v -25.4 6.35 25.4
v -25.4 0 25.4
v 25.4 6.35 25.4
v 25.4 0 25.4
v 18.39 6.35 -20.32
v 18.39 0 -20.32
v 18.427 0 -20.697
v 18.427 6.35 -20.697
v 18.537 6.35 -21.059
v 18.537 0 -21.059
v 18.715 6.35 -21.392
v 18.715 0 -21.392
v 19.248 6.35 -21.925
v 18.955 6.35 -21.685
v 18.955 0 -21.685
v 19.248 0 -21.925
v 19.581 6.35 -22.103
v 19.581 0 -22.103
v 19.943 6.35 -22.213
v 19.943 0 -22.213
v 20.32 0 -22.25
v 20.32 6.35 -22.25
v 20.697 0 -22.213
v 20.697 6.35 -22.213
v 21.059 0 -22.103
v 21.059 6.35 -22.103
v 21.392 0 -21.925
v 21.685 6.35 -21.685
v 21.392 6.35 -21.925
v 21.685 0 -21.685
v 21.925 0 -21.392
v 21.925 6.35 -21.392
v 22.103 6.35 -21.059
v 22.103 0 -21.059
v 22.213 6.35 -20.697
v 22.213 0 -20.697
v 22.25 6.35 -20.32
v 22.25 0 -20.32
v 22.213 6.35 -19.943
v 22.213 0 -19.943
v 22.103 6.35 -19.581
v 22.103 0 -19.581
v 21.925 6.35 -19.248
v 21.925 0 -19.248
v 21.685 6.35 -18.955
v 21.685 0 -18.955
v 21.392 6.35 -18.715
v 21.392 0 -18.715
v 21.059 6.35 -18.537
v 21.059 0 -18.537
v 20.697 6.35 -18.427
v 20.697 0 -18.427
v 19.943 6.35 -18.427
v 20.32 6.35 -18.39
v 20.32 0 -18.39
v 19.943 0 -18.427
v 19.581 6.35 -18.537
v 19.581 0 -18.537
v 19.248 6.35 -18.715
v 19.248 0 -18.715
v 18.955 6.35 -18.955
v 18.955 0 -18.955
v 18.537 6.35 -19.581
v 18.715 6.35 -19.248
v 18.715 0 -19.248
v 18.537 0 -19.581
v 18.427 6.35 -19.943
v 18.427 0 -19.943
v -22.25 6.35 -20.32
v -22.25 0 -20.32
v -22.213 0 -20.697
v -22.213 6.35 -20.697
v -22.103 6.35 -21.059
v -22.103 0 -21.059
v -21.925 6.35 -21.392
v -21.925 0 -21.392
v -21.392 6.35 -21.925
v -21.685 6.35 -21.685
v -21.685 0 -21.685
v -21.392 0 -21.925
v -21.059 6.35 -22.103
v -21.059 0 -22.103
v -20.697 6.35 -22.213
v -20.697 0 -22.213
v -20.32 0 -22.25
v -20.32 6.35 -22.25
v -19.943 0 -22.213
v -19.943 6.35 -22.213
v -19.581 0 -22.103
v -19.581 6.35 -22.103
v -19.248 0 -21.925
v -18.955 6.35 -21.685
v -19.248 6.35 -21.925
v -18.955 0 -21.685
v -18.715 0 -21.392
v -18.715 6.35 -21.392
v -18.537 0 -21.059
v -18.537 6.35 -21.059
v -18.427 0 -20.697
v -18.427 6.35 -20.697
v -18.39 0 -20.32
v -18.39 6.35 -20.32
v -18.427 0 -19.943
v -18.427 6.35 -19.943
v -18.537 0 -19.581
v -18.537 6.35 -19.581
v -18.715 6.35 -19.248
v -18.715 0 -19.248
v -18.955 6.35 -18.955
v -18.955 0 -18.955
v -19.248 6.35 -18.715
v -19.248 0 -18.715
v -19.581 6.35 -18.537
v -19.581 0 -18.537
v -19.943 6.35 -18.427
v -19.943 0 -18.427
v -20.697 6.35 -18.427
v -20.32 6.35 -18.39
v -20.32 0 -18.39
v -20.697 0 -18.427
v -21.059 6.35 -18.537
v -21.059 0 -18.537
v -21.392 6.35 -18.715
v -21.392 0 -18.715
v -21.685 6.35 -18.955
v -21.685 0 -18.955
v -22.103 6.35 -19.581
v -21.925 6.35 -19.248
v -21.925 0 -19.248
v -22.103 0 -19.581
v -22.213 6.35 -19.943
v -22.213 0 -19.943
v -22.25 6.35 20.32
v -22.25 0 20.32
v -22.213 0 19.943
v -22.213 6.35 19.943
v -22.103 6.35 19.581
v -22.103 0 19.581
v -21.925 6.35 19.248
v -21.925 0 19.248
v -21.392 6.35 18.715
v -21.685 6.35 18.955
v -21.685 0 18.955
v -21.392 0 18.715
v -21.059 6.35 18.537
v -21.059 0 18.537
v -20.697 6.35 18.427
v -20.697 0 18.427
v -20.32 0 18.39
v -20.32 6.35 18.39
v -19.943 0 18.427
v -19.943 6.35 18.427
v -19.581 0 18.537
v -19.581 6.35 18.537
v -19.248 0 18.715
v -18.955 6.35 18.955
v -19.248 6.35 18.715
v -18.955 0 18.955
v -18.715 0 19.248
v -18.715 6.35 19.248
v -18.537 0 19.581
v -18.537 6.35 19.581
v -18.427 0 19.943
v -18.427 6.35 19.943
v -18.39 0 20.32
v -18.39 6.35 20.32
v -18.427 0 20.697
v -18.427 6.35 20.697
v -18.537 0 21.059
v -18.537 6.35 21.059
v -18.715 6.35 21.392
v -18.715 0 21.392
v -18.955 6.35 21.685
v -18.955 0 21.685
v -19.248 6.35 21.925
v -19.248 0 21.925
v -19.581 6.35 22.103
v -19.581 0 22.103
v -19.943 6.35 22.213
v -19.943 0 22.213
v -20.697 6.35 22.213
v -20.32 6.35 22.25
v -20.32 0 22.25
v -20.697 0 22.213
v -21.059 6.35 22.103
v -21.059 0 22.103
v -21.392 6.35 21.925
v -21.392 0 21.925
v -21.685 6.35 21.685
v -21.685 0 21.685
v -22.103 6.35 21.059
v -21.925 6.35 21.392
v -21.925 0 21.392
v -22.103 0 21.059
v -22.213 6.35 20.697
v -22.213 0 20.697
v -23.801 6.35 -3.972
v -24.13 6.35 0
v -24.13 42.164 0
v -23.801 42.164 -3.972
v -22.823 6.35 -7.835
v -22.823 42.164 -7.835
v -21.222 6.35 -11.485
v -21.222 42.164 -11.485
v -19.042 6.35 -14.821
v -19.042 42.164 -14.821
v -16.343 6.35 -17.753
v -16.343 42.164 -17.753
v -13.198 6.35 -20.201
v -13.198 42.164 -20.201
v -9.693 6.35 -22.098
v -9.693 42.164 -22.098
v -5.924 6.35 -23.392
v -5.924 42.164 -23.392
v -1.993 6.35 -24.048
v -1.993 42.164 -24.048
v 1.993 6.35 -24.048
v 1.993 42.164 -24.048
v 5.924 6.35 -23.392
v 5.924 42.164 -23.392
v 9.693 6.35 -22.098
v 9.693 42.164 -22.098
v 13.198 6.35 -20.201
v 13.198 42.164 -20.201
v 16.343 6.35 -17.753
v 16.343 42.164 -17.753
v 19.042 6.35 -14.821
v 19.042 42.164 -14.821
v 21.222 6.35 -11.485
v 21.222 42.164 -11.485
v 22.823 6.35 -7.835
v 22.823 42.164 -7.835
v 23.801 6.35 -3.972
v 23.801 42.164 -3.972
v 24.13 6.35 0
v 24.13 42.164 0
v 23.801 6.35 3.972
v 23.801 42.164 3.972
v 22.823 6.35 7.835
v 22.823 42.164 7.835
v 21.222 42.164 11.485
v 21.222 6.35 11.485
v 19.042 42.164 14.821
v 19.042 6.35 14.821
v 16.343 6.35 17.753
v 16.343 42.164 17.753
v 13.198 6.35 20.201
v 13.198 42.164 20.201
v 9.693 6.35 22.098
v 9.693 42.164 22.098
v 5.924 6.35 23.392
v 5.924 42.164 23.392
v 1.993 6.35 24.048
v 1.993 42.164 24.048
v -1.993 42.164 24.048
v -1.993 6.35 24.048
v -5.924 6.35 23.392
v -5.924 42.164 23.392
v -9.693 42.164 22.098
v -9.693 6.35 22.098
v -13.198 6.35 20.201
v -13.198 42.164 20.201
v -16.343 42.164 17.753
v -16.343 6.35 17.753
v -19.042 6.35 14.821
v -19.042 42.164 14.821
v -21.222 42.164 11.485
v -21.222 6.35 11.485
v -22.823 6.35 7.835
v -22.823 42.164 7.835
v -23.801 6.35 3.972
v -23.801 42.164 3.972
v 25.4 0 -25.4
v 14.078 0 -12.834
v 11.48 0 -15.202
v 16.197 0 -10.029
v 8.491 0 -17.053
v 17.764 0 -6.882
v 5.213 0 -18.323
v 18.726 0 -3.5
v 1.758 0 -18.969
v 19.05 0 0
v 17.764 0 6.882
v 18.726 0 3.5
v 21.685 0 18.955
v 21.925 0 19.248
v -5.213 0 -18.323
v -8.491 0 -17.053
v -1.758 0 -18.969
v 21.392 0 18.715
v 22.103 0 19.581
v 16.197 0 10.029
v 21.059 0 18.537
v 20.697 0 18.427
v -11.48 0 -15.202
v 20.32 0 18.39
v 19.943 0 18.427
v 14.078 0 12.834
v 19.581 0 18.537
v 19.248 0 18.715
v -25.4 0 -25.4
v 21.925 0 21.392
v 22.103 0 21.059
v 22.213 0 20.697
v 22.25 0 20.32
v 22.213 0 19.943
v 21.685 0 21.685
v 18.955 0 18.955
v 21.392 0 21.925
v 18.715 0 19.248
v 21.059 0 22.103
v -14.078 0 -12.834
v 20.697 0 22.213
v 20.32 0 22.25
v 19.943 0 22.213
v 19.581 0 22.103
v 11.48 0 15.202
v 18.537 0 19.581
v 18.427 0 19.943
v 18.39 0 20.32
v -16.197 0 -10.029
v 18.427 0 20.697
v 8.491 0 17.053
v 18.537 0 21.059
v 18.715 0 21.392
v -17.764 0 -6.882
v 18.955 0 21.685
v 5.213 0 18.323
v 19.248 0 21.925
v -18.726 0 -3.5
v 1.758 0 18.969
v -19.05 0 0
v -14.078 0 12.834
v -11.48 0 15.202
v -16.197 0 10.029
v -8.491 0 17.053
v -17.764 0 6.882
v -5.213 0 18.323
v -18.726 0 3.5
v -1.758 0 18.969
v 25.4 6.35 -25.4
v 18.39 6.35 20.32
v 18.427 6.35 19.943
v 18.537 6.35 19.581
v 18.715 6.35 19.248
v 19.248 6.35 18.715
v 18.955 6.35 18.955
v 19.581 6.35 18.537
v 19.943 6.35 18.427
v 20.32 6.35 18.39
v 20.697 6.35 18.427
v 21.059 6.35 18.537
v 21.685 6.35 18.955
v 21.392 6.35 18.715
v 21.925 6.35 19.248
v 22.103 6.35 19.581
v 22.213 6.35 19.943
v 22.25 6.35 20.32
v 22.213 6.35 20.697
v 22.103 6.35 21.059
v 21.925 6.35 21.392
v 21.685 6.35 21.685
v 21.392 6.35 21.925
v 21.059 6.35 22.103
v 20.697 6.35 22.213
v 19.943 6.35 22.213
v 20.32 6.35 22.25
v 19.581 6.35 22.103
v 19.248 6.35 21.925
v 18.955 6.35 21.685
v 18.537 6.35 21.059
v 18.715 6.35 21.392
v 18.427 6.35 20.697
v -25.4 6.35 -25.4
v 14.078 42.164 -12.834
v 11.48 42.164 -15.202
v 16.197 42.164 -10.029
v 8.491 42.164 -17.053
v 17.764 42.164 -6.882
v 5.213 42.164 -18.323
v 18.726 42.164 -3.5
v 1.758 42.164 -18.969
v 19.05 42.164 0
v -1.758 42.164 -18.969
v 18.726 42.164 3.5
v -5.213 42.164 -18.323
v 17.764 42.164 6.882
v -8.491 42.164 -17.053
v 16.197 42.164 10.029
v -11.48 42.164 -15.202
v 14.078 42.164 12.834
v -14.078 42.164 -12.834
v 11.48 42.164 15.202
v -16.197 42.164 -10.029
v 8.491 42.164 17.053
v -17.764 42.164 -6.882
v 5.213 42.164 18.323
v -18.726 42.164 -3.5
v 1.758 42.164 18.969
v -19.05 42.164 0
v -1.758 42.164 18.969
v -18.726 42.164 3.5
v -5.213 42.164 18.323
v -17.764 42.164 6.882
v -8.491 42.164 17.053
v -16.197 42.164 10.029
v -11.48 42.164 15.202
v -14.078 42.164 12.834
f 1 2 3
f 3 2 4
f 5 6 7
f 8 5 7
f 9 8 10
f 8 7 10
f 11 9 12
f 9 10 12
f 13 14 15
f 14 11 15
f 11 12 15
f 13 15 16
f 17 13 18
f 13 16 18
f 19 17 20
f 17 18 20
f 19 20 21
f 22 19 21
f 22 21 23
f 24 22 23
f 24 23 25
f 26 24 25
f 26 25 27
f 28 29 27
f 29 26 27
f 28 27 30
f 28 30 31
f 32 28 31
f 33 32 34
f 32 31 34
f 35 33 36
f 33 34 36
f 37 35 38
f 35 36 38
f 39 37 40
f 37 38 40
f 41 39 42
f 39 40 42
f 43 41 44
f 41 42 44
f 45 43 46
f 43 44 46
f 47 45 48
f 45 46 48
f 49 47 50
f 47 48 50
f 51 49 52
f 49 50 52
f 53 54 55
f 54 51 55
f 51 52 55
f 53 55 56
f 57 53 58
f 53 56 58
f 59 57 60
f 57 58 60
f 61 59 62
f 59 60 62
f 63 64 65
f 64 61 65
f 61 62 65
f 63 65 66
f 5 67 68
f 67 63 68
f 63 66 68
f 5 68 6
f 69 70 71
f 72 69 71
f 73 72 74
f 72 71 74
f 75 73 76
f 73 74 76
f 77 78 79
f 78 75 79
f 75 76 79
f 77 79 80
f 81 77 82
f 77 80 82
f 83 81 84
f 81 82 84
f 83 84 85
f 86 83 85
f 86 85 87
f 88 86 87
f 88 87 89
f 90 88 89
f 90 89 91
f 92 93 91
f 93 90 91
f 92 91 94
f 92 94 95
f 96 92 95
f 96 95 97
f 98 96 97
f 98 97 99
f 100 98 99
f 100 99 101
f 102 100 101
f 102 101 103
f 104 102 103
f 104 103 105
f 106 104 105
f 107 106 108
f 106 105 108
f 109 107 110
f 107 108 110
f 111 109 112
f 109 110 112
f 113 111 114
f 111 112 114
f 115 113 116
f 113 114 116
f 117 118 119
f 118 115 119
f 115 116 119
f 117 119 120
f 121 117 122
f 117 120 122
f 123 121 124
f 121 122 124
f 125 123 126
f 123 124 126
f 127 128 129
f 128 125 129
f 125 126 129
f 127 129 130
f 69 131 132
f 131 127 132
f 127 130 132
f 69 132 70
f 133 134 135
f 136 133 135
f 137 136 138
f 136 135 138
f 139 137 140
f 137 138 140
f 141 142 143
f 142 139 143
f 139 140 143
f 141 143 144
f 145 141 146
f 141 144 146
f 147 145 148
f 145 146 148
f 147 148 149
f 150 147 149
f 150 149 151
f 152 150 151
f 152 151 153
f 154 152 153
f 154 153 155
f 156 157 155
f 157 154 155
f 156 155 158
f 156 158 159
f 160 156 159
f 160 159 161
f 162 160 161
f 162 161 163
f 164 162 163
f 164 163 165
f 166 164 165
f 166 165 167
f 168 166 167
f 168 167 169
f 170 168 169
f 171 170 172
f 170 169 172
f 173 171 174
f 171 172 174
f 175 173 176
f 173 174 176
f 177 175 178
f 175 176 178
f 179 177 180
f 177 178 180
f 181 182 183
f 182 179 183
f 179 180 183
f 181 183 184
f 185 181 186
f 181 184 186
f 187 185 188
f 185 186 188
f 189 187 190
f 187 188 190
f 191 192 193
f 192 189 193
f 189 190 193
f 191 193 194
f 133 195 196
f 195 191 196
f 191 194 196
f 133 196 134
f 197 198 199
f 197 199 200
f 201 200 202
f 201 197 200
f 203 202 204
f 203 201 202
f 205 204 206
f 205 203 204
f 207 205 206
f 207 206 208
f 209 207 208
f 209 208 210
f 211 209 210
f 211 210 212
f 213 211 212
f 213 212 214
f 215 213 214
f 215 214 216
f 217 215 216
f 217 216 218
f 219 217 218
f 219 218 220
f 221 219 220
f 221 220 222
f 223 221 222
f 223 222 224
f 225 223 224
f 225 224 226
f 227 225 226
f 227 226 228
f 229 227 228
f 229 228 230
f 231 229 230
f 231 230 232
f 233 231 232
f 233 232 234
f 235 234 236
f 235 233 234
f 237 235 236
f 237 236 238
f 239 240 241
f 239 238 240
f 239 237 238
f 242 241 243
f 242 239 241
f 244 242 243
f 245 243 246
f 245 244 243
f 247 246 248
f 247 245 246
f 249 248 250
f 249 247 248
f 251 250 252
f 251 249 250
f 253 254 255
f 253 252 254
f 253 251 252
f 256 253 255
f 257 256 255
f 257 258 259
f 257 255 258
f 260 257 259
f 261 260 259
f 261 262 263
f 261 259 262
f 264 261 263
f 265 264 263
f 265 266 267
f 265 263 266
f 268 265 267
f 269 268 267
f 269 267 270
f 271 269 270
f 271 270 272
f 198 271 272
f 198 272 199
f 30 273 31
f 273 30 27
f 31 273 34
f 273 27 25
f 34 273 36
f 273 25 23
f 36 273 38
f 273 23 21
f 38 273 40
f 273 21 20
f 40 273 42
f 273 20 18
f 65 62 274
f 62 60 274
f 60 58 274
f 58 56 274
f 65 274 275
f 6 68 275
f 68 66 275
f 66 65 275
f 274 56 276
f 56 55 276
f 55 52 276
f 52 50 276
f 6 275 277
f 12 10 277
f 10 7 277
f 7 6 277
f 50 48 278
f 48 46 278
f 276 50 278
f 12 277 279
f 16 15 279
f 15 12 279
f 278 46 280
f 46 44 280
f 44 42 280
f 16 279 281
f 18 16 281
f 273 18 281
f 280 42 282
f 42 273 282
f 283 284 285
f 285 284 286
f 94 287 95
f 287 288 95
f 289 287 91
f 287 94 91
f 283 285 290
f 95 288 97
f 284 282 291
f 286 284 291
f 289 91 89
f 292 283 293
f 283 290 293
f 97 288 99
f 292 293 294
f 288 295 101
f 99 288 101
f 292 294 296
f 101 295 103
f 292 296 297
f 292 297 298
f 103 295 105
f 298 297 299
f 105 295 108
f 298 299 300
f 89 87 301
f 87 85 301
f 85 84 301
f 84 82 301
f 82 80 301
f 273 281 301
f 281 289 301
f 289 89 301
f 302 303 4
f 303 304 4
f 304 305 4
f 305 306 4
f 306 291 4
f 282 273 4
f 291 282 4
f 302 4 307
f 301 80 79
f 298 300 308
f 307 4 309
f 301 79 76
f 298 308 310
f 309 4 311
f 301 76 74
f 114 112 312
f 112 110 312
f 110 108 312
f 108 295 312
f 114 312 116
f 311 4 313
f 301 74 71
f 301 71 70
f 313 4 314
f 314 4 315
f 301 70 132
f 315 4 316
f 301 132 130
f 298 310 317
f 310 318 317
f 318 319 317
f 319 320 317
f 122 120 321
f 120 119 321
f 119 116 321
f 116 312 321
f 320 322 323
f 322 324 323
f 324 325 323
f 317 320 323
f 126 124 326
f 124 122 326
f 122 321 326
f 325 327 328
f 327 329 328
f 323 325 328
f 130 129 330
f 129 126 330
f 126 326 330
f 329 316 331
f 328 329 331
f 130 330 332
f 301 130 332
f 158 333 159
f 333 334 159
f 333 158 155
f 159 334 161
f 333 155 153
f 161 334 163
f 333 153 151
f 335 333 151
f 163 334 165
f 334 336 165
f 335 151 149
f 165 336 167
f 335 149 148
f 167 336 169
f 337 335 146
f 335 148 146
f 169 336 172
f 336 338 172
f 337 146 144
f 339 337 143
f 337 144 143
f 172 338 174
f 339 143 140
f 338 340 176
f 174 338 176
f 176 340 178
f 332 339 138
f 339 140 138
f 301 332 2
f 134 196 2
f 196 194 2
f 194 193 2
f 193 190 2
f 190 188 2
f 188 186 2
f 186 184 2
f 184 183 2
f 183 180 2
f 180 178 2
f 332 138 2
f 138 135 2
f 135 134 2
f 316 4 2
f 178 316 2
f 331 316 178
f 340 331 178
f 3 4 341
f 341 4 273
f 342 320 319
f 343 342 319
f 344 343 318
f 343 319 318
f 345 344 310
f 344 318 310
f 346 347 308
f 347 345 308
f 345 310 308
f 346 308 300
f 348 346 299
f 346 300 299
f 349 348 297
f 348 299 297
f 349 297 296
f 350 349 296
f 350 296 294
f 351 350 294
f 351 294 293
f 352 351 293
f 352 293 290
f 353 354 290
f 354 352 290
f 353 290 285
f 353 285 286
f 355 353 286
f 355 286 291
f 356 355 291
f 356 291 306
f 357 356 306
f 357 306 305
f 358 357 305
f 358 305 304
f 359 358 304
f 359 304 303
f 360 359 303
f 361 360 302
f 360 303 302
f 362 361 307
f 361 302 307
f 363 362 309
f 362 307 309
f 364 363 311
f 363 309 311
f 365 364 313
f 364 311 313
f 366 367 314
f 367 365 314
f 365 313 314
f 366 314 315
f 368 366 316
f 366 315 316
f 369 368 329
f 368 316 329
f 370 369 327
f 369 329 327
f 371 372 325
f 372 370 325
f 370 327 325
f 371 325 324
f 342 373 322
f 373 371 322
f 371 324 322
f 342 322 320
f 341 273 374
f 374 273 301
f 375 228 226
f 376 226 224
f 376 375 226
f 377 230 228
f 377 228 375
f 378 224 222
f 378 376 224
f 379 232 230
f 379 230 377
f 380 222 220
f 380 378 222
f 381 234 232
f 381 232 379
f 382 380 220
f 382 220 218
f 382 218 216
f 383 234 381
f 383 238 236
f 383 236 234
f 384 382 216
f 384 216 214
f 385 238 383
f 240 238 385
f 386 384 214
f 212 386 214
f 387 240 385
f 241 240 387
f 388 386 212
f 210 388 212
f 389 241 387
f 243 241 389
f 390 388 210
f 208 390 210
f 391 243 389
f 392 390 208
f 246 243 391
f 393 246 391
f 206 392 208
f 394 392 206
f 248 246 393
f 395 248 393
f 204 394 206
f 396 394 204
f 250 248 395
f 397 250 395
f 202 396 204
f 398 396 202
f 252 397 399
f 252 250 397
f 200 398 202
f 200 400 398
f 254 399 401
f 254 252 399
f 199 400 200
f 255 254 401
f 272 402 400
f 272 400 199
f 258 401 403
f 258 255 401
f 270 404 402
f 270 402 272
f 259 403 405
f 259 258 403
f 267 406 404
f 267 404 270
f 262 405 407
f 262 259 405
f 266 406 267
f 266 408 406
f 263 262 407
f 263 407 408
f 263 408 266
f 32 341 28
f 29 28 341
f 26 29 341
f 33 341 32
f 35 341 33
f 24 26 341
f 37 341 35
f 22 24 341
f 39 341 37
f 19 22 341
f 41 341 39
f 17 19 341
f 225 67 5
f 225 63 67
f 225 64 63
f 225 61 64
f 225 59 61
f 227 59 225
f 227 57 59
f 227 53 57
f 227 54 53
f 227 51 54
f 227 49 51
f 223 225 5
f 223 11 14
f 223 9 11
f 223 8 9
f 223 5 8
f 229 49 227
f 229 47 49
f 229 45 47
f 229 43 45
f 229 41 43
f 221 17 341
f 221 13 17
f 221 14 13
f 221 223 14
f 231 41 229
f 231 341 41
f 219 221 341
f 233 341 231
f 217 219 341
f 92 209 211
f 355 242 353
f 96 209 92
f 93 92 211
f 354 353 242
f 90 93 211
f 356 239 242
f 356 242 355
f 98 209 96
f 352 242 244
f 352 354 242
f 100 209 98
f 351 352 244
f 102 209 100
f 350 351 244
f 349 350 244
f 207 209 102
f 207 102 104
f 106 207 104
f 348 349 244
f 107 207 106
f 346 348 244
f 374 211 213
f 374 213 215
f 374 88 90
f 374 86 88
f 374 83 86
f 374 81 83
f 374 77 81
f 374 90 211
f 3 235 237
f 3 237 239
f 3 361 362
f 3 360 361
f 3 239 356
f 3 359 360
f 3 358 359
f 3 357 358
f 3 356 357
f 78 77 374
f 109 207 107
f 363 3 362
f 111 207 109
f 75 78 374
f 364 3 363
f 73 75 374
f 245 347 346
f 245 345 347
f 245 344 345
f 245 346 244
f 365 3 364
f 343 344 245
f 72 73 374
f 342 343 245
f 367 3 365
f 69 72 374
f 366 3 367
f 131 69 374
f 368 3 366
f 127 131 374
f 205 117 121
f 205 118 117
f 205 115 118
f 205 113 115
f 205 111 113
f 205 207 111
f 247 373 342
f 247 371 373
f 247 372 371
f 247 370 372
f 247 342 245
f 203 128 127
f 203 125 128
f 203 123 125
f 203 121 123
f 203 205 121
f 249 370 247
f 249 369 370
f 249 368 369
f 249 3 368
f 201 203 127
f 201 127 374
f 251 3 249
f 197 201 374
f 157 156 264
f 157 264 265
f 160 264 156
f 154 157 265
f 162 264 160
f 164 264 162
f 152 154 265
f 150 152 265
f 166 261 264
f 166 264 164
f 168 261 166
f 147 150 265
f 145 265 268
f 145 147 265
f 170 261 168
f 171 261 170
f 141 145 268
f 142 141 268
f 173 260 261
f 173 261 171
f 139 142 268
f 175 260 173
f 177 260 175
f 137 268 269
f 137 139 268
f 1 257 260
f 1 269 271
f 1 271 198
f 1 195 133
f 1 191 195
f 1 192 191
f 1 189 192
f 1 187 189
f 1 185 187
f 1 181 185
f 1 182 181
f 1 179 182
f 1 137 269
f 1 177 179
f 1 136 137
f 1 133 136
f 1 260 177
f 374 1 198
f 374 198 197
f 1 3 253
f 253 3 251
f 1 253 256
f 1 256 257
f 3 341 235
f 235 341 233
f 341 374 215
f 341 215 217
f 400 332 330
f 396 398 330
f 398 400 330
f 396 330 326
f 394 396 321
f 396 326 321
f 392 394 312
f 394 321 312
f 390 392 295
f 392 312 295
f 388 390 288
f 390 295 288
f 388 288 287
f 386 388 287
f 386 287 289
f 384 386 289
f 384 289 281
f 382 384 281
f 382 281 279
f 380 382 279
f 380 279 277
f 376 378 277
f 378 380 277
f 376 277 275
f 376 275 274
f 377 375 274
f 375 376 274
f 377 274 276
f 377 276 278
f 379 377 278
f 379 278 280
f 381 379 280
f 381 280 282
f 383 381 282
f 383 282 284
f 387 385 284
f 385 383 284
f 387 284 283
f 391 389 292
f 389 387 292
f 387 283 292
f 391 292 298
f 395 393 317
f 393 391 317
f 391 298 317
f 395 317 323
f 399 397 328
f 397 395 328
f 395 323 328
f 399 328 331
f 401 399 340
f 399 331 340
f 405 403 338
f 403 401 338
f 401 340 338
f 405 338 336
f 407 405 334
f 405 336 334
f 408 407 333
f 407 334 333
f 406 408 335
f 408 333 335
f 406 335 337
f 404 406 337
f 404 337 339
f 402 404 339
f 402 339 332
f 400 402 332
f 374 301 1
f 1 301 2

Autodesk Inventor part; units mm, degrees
ref_plane "YZ Plane" through (0, 0, 0) normal (1, 0, 0) x (0, 1, 0)
ref_plane "XZ Plane" through (0, 0, 0) normal (0, 1, 0) x (-1, 0, 0)
ref_plane "XY Plane" through (0, 0, 0) normal (0, 0, 1) x (1, 0, 0)
sketch "Sketch1" plane through (0, 0, 0) normal (0, 1, 0) x (-1, 0, 0)
  circle A0 centre (0, 0) radius 19.05
  circle A1 centre (0, 0) radius 24.13
  line L0 (25.4, 25.4) -> (-25.4, 25.4)
  line L1 (-25.4, 25.4) -> (-25.4, -25.4)
  line L2 (-25.4, -25.4) -> (25.4, -25.4)
  line L3 (25.4, -25.4) -> (25.4, 25.4)
  line L4 (-25.4, -25.4) -> (-12.1092, -25.4) construction
  circle A2 centre (-20.32, -20.32) radius 1.9304
  circle A3 centre (-20.32, 20.32) radius 1.9304
  circle A4 centre (20.32, -20.32) radius 1.9304
  circle A5 centre (20.32, 20.32) radius 1.9304
  dimension "d10" = 50.8
  dimension "d11" = 50.8
  dimension "d20" = 3.8608
  dimension "d25" = 3.8608
  dimension "d26" = 3.8608
  dimension "d27" = 3.8608
extrude "Extrusion1" add sketch "Sketch1" along normal blind 42.164 contours A1
extrude "Extrusion3" add sketch "Sketch1" along normal blind 6.35 contours A1 | L3 L2 L1 L0 | A2 | A3 | A4 | A5
extrude "Extrusion5" cut sketch "Sketch1" along normal blind 6.35 contours A2 | A3 | A4 | A5
properties part number "Cylinders"
